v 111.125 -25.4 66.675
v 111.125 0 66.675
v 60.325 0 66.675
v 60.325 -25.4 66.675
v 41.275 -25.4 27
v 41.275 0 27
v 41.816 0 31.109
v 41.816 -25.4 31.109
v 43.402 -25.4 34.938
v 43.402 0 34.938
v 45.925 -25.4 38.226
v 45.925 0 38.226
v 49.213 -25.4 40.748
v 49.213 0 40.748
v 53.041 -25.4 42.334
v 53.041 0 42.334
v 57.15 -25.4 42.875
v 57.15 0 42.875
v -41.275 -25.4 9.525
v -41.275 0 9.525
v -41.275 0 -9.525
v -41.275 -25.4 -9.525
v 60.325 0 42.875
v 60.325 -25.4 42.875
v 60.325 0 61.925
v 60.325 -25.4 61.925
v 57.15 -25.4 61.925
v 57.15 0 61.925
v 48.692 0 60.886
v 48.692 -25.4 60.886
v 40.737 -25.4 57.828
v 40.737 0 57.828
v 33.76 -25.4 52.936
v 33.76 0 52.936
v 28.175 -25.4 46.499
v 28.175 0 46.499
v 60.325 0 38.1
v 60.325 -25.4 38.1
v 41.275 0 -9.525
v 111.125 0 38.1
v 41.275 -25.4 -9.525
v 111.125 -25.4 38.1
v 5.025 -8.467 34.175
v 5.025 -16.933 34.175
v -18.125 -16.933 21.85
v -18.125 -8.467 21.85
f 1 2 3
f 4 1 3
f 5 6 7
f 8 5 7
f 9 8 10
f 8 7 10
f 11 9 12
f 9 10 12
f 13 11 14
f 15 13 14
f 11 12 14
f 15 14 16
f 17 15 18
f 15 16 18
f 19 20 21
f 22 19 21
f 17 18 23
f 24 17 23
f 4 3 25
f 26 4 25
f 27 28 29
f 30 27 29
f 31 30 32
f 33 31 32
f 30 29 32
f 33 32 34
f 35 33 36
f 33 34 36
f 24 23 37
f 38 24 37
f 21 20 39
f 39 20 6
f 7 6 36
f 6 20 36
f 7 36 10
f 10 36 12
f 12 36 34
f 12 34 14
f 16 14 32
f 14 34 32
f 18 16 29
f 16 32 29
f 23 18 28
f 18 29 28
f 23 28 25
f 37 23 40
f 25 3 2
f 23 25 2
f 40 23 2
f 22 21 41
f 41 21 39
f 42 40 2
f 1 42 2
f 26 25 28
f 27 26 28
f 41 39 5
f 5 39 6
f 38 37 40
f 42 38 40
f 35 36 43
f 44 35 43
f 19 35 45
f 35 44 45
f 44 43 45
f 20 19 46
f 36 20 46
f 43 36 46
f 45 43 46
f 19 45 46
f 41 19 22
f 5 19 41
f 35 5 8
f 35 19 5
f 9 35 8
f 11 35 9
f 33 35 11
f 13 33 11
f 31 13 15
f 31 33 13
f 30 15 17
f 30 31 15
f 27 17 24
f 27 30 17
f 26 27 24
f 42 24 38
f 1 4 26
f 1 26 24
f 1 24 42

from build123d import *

# Parameters (mm, degrees)
F1_DEPTH = 25.4


# Not quite as in the source:
# - a feature names something its author has since deleted; it is built from what else it names


with BuildPart() as f1:
    # F0 (on Front) → F1 (new body)
    with BuildSketch(Plane.XZ):
        Polygon((-41.275, -9.525), (41.275, -9.525), (41.275, 9.525), (22.225, 9.525), (-41.275, 9.525), align=None)
        with BuildLine():
            Line((22.225, 9.525), (41.275, 9.525))
            Line((41.275, 9.525), (41.275, 27.0002))
            ThreePointArc((41.275, 27.0002), (45.9246798487, 38.2255201513), (57.15, 42.8752))
            Line((57.15, 42.8752), (60.325, 42.8752))
            Line((60.325, 42.8752), (60.325, 61.9252))
            Line((60.325, 61.9252), (57.15, 61.9252))
            add(Edge.make_bspline(
                [(57.15, 61.9252), (47.4917497752, 56.7832722029), (37.8334995503, 51.6413444058), (28.1752493255, 46.4994166087)],
                knots=[0, 0, 0, 0, 32.8251575759, 32.8251575759, 32.8251575759, 32.8251575759], degree=3))
            ThreePointArc((28.1752493255, 46.4994166087), (23.7456680032, 37.1936404813), (22.225, 27.0002))
            Line((22.225, 27.0002), (22.225, 9.525))
        make_face()
        with BuildLine():
            add(Edge.make_bspline(
                [(28.1752493255, 46.4994166087), (5.025166217, 34.1746110724), (-18.1249168915, 21.8498055362), (-41.275, 9.525)],
                knots=[32.8251575759, 32.8251575759, 32.8251575759, 32.8251575759, 111.5045361635, 111.5045361635, 111.5045361635, 111.5045361635], degree=3))
            Line((-41.275, 9.525), (22.225, 9.525))
            Line((22.225, 9.525), (22.225, 27.0002))
            ThreePointArc((22.225, 27.0002), (23.7456680032, 37.1936404813), (28.1752493255, 46.4994166087))
        make_face()
        with BuildLine():
            ThreePointArc((57.15, 61.9252), (40.737421212, 57.8284805639), (28.1752493255, 46.4994166087))
            add(Edge.make_bspline(
                [(57.15, 61.9252), (47.4917497752, 56.7832722029), (37.8334995503, 51.6413444058), (28.1752493255, 46.4994166087)],
                knots=[0, 0, 0, 0, 32.8251575759, 32.8251575759, 32.8251575759, 32.8251575759], degree=3))
        make_face()
        Polygon((60.325, 61.9252), (60.325, 42.8752), (60.325, 38.1), (111.125, 38.1), (111.125, 66.675), (60.325, 66.675), align=None)
    extrude(amount=F1_DEPTH)


solid = f1.part
